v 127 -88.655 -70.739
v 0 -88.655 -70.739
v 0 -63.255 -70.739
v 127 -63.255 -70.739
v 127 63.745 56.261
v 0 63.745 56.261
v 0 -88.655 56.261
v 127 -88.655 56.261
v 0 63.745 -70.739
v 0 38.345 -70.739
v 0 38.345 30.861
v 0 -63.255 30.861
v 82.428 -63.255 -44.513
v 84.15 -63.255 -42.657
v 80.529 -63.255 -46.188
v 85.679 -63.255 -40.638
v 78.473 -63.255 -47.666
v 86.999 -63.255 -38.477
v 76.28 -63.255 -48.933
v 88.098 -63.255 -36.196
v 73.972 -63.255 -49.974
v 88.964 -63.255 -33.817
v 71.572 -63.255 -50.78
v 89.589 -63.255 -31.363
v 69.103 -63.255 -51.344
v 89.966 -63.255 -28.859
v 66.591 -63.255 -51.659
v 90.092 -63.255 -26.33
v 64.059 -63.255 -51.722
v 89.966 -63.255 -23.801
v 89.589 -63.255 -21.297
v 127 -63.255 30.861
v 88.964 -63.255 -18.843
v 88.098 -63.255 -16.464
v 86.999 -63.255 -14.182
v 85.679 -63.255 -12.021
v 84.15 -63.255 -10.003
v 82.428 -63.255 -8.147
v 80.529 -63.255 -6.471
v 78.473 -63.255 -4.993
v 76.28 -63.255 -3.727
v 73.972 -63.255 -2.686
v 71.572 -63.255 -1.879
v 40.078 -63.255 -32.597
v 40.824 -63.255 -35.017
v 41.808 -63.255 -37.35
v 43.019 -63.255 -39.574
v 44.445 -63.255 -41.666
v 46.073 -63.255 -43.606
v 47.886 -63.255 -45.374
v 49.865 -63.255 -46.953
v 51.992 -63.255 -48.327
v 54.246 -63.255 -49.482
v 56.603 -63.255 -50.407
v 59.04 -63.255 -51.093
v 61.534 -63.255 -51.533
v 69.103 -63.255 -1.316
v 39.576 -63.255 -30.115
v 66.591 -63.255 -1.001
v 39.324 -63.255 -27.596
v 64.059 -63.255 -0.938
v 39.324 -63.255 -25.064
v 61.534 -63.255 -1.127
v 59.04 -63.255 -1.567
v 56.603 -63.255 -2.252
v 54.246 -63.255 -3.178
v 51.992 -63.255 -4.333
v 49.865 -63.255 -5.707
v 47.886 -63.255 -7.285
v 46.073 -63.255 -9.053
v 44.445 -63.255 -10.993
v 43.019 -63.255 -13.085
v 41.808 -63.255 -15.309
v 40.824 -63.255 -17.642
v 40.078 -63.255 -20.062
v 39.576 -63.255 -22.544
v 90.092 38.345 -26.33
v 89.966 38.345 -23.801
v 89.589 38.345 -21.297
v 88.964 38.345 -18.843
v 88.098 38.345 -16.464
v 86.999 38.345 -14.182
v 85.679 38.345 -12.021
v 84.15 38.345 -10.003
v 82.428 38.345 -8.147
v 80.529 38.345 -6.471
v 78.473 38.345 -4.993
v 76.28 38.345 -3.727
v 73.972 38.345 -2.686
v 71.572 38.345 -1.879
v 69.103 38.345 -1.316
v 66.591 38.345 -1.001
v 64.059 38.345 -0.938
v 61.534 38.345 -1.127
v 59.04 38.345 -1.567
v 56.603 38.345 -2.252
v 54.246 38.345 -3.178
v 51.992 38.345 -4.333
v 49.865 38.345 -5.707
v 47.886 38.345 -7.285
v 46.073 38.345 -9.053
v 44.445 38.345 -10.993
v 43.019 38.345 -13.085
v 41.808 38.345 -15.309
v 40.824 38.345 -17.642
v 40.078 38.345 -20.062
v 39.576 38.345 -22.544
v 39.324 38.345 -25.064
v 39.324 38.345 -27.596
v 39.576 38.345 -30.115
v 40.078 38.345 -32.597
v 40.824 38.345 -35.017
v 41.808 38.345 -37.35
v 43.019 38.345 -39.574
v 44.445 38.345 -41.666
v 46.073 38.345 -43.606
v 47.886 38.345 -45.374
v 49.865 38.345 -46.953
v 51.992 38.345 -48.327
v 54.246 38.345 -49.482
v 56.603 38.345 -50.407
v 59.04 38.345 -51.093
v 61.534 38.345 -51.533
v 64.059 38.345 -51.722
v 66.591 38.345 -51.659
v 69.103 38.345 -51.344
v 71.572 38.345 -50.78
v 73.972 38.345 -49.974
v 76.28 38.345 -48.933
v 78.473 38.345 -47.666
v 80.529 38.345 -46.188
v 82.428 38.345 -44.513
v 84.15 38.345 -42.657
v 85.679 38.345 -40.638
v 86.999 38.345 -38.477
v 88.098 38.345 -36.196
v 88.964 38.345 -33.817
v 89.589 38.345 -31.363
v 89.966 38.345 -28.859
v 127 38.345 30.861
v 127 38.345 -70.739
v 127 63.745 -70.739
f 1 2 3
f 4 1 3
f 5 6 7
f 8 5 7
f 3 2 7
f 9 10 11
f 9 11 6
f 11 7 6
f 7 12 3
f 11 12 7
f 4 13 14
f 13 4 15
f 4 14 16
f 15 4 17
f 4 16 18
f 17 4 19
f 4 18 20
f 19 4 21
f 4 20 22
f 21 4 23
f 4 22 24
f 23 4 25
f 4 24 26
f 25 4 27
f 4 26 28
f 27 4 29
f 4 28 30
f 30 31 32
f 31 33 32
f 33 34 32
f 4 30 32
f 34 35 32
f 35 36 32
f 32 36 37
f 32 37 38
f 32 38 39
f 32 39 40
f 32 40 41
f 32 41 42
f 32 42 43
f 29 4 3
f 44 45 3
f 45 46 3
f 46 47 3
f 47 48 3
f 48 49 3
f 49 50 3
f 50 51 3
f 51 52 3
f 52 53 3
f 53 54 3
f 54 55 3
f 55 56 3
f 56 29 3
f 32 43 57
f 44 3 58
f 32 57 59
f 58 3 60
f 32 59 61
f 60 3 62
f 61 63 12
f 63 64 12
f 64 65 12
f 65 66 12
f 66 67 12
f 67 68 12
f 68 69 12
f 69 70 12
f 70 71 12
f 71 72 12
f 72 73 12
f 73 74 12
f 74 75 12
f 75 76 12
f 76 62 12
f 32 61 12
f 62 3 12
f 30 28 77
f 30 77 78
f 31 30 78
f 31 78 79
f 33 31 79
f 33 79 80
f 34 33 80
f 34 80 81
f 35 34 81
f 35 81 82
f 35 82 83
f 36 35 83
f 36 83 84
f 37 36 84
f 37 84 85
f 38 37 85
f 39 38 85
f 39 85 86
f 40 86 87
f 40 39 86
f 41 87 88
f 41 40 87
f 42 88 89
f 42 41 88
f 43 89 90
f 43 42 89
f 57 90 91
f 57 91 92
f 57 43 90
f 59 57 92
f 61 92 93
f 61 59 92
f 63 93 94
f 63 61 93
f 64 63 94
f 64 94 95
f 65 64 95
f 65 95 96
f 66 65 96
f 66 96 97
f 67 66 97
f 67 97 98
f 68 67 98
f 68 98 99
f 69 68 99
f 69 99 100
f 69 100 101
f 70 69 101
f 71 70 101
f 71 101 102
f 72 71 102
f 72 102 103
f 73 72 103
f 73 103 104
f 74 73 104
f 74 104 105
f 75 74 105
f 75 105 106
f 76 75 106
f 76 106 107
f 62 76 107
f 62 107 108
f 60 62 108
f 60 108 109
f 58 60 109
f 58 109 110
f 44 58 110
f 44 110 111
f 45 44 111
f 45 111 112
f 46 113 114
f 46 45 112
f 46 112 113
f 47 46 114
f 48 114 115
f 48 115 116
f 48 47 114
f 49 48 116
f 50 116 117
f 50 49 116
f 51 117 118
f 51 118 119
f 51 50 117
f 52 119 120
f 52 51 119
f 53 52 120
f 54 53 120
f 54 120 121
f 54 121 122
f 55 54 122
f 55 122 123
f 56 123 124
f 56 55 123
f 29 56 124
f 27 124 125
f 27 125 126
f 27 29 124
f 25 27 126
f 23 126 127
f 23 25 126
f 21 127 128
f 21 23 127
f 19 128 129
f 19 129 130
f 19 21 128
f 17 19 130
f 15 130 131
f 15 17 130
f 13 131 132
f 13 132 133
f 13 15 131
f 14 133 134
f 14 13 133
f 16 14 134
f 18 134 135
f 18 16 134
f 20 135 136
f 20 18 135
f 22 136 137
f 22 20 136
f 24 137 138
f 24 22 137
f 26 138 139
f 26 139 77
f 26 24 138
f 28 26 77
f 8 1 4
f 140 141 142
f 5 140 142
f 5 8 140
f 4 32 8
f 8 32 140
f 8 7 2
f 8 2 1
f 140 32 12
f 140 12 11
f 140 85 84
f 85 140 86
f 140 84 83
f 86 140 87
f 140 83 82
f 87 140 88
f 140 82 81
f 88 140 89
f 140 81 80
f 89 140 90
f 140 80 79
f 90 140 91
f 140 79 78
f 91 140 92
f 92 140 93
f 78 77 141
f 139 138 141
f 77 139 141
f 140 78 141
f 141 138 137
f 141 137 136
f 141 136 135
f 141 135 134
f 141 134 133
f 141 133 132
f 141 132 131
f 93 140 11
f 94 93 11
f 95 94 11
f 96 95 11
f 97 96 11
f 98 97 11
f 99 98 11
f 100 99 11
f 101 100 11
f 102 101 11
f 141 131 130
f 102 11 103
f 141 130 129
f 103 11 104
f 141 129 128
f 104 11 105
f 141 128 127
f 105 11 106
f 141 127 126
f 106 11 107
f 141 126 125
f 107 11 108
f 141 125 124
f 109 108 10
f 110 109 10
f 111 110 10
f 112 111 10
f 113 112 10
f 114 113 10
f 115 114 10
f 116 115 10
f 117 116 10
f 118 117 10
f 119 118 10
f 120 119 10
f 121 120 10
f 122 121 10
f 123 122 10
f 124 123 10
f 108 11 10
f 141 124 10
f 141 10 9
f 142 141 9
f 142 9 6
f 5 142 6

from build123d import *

# Parameters (mm, degrees)
F1_DEPTH = 127
F2_R     = 25.4
F3_DEPTH = 152.4


with BuildPart() as f1:
    # F0 (on Right) → F1 (new body)
    with BuildSketch(Plane.YZ):
        Polygon((63.745255, 56.260998), (-88.654745, 56.260998), (-88.654745, -70.739002), (-63.254745, -70.739002), (-63.254745, 30.860998), (38.345255, 30.860998), (38.345255, -70.739002), (63.745255, -70.739002), align=None)
    extrude(amount=F1_DEPTH)

    # F2 (on face) → F3 (join)
    with BuildSketch(Plane.XZ.offset(88.654745)):
        with Locations((64.692467, -26.329797)):
            Circle(F2_R)
    extrude(amount=-F3_DEPTH)


solid = f1.part
